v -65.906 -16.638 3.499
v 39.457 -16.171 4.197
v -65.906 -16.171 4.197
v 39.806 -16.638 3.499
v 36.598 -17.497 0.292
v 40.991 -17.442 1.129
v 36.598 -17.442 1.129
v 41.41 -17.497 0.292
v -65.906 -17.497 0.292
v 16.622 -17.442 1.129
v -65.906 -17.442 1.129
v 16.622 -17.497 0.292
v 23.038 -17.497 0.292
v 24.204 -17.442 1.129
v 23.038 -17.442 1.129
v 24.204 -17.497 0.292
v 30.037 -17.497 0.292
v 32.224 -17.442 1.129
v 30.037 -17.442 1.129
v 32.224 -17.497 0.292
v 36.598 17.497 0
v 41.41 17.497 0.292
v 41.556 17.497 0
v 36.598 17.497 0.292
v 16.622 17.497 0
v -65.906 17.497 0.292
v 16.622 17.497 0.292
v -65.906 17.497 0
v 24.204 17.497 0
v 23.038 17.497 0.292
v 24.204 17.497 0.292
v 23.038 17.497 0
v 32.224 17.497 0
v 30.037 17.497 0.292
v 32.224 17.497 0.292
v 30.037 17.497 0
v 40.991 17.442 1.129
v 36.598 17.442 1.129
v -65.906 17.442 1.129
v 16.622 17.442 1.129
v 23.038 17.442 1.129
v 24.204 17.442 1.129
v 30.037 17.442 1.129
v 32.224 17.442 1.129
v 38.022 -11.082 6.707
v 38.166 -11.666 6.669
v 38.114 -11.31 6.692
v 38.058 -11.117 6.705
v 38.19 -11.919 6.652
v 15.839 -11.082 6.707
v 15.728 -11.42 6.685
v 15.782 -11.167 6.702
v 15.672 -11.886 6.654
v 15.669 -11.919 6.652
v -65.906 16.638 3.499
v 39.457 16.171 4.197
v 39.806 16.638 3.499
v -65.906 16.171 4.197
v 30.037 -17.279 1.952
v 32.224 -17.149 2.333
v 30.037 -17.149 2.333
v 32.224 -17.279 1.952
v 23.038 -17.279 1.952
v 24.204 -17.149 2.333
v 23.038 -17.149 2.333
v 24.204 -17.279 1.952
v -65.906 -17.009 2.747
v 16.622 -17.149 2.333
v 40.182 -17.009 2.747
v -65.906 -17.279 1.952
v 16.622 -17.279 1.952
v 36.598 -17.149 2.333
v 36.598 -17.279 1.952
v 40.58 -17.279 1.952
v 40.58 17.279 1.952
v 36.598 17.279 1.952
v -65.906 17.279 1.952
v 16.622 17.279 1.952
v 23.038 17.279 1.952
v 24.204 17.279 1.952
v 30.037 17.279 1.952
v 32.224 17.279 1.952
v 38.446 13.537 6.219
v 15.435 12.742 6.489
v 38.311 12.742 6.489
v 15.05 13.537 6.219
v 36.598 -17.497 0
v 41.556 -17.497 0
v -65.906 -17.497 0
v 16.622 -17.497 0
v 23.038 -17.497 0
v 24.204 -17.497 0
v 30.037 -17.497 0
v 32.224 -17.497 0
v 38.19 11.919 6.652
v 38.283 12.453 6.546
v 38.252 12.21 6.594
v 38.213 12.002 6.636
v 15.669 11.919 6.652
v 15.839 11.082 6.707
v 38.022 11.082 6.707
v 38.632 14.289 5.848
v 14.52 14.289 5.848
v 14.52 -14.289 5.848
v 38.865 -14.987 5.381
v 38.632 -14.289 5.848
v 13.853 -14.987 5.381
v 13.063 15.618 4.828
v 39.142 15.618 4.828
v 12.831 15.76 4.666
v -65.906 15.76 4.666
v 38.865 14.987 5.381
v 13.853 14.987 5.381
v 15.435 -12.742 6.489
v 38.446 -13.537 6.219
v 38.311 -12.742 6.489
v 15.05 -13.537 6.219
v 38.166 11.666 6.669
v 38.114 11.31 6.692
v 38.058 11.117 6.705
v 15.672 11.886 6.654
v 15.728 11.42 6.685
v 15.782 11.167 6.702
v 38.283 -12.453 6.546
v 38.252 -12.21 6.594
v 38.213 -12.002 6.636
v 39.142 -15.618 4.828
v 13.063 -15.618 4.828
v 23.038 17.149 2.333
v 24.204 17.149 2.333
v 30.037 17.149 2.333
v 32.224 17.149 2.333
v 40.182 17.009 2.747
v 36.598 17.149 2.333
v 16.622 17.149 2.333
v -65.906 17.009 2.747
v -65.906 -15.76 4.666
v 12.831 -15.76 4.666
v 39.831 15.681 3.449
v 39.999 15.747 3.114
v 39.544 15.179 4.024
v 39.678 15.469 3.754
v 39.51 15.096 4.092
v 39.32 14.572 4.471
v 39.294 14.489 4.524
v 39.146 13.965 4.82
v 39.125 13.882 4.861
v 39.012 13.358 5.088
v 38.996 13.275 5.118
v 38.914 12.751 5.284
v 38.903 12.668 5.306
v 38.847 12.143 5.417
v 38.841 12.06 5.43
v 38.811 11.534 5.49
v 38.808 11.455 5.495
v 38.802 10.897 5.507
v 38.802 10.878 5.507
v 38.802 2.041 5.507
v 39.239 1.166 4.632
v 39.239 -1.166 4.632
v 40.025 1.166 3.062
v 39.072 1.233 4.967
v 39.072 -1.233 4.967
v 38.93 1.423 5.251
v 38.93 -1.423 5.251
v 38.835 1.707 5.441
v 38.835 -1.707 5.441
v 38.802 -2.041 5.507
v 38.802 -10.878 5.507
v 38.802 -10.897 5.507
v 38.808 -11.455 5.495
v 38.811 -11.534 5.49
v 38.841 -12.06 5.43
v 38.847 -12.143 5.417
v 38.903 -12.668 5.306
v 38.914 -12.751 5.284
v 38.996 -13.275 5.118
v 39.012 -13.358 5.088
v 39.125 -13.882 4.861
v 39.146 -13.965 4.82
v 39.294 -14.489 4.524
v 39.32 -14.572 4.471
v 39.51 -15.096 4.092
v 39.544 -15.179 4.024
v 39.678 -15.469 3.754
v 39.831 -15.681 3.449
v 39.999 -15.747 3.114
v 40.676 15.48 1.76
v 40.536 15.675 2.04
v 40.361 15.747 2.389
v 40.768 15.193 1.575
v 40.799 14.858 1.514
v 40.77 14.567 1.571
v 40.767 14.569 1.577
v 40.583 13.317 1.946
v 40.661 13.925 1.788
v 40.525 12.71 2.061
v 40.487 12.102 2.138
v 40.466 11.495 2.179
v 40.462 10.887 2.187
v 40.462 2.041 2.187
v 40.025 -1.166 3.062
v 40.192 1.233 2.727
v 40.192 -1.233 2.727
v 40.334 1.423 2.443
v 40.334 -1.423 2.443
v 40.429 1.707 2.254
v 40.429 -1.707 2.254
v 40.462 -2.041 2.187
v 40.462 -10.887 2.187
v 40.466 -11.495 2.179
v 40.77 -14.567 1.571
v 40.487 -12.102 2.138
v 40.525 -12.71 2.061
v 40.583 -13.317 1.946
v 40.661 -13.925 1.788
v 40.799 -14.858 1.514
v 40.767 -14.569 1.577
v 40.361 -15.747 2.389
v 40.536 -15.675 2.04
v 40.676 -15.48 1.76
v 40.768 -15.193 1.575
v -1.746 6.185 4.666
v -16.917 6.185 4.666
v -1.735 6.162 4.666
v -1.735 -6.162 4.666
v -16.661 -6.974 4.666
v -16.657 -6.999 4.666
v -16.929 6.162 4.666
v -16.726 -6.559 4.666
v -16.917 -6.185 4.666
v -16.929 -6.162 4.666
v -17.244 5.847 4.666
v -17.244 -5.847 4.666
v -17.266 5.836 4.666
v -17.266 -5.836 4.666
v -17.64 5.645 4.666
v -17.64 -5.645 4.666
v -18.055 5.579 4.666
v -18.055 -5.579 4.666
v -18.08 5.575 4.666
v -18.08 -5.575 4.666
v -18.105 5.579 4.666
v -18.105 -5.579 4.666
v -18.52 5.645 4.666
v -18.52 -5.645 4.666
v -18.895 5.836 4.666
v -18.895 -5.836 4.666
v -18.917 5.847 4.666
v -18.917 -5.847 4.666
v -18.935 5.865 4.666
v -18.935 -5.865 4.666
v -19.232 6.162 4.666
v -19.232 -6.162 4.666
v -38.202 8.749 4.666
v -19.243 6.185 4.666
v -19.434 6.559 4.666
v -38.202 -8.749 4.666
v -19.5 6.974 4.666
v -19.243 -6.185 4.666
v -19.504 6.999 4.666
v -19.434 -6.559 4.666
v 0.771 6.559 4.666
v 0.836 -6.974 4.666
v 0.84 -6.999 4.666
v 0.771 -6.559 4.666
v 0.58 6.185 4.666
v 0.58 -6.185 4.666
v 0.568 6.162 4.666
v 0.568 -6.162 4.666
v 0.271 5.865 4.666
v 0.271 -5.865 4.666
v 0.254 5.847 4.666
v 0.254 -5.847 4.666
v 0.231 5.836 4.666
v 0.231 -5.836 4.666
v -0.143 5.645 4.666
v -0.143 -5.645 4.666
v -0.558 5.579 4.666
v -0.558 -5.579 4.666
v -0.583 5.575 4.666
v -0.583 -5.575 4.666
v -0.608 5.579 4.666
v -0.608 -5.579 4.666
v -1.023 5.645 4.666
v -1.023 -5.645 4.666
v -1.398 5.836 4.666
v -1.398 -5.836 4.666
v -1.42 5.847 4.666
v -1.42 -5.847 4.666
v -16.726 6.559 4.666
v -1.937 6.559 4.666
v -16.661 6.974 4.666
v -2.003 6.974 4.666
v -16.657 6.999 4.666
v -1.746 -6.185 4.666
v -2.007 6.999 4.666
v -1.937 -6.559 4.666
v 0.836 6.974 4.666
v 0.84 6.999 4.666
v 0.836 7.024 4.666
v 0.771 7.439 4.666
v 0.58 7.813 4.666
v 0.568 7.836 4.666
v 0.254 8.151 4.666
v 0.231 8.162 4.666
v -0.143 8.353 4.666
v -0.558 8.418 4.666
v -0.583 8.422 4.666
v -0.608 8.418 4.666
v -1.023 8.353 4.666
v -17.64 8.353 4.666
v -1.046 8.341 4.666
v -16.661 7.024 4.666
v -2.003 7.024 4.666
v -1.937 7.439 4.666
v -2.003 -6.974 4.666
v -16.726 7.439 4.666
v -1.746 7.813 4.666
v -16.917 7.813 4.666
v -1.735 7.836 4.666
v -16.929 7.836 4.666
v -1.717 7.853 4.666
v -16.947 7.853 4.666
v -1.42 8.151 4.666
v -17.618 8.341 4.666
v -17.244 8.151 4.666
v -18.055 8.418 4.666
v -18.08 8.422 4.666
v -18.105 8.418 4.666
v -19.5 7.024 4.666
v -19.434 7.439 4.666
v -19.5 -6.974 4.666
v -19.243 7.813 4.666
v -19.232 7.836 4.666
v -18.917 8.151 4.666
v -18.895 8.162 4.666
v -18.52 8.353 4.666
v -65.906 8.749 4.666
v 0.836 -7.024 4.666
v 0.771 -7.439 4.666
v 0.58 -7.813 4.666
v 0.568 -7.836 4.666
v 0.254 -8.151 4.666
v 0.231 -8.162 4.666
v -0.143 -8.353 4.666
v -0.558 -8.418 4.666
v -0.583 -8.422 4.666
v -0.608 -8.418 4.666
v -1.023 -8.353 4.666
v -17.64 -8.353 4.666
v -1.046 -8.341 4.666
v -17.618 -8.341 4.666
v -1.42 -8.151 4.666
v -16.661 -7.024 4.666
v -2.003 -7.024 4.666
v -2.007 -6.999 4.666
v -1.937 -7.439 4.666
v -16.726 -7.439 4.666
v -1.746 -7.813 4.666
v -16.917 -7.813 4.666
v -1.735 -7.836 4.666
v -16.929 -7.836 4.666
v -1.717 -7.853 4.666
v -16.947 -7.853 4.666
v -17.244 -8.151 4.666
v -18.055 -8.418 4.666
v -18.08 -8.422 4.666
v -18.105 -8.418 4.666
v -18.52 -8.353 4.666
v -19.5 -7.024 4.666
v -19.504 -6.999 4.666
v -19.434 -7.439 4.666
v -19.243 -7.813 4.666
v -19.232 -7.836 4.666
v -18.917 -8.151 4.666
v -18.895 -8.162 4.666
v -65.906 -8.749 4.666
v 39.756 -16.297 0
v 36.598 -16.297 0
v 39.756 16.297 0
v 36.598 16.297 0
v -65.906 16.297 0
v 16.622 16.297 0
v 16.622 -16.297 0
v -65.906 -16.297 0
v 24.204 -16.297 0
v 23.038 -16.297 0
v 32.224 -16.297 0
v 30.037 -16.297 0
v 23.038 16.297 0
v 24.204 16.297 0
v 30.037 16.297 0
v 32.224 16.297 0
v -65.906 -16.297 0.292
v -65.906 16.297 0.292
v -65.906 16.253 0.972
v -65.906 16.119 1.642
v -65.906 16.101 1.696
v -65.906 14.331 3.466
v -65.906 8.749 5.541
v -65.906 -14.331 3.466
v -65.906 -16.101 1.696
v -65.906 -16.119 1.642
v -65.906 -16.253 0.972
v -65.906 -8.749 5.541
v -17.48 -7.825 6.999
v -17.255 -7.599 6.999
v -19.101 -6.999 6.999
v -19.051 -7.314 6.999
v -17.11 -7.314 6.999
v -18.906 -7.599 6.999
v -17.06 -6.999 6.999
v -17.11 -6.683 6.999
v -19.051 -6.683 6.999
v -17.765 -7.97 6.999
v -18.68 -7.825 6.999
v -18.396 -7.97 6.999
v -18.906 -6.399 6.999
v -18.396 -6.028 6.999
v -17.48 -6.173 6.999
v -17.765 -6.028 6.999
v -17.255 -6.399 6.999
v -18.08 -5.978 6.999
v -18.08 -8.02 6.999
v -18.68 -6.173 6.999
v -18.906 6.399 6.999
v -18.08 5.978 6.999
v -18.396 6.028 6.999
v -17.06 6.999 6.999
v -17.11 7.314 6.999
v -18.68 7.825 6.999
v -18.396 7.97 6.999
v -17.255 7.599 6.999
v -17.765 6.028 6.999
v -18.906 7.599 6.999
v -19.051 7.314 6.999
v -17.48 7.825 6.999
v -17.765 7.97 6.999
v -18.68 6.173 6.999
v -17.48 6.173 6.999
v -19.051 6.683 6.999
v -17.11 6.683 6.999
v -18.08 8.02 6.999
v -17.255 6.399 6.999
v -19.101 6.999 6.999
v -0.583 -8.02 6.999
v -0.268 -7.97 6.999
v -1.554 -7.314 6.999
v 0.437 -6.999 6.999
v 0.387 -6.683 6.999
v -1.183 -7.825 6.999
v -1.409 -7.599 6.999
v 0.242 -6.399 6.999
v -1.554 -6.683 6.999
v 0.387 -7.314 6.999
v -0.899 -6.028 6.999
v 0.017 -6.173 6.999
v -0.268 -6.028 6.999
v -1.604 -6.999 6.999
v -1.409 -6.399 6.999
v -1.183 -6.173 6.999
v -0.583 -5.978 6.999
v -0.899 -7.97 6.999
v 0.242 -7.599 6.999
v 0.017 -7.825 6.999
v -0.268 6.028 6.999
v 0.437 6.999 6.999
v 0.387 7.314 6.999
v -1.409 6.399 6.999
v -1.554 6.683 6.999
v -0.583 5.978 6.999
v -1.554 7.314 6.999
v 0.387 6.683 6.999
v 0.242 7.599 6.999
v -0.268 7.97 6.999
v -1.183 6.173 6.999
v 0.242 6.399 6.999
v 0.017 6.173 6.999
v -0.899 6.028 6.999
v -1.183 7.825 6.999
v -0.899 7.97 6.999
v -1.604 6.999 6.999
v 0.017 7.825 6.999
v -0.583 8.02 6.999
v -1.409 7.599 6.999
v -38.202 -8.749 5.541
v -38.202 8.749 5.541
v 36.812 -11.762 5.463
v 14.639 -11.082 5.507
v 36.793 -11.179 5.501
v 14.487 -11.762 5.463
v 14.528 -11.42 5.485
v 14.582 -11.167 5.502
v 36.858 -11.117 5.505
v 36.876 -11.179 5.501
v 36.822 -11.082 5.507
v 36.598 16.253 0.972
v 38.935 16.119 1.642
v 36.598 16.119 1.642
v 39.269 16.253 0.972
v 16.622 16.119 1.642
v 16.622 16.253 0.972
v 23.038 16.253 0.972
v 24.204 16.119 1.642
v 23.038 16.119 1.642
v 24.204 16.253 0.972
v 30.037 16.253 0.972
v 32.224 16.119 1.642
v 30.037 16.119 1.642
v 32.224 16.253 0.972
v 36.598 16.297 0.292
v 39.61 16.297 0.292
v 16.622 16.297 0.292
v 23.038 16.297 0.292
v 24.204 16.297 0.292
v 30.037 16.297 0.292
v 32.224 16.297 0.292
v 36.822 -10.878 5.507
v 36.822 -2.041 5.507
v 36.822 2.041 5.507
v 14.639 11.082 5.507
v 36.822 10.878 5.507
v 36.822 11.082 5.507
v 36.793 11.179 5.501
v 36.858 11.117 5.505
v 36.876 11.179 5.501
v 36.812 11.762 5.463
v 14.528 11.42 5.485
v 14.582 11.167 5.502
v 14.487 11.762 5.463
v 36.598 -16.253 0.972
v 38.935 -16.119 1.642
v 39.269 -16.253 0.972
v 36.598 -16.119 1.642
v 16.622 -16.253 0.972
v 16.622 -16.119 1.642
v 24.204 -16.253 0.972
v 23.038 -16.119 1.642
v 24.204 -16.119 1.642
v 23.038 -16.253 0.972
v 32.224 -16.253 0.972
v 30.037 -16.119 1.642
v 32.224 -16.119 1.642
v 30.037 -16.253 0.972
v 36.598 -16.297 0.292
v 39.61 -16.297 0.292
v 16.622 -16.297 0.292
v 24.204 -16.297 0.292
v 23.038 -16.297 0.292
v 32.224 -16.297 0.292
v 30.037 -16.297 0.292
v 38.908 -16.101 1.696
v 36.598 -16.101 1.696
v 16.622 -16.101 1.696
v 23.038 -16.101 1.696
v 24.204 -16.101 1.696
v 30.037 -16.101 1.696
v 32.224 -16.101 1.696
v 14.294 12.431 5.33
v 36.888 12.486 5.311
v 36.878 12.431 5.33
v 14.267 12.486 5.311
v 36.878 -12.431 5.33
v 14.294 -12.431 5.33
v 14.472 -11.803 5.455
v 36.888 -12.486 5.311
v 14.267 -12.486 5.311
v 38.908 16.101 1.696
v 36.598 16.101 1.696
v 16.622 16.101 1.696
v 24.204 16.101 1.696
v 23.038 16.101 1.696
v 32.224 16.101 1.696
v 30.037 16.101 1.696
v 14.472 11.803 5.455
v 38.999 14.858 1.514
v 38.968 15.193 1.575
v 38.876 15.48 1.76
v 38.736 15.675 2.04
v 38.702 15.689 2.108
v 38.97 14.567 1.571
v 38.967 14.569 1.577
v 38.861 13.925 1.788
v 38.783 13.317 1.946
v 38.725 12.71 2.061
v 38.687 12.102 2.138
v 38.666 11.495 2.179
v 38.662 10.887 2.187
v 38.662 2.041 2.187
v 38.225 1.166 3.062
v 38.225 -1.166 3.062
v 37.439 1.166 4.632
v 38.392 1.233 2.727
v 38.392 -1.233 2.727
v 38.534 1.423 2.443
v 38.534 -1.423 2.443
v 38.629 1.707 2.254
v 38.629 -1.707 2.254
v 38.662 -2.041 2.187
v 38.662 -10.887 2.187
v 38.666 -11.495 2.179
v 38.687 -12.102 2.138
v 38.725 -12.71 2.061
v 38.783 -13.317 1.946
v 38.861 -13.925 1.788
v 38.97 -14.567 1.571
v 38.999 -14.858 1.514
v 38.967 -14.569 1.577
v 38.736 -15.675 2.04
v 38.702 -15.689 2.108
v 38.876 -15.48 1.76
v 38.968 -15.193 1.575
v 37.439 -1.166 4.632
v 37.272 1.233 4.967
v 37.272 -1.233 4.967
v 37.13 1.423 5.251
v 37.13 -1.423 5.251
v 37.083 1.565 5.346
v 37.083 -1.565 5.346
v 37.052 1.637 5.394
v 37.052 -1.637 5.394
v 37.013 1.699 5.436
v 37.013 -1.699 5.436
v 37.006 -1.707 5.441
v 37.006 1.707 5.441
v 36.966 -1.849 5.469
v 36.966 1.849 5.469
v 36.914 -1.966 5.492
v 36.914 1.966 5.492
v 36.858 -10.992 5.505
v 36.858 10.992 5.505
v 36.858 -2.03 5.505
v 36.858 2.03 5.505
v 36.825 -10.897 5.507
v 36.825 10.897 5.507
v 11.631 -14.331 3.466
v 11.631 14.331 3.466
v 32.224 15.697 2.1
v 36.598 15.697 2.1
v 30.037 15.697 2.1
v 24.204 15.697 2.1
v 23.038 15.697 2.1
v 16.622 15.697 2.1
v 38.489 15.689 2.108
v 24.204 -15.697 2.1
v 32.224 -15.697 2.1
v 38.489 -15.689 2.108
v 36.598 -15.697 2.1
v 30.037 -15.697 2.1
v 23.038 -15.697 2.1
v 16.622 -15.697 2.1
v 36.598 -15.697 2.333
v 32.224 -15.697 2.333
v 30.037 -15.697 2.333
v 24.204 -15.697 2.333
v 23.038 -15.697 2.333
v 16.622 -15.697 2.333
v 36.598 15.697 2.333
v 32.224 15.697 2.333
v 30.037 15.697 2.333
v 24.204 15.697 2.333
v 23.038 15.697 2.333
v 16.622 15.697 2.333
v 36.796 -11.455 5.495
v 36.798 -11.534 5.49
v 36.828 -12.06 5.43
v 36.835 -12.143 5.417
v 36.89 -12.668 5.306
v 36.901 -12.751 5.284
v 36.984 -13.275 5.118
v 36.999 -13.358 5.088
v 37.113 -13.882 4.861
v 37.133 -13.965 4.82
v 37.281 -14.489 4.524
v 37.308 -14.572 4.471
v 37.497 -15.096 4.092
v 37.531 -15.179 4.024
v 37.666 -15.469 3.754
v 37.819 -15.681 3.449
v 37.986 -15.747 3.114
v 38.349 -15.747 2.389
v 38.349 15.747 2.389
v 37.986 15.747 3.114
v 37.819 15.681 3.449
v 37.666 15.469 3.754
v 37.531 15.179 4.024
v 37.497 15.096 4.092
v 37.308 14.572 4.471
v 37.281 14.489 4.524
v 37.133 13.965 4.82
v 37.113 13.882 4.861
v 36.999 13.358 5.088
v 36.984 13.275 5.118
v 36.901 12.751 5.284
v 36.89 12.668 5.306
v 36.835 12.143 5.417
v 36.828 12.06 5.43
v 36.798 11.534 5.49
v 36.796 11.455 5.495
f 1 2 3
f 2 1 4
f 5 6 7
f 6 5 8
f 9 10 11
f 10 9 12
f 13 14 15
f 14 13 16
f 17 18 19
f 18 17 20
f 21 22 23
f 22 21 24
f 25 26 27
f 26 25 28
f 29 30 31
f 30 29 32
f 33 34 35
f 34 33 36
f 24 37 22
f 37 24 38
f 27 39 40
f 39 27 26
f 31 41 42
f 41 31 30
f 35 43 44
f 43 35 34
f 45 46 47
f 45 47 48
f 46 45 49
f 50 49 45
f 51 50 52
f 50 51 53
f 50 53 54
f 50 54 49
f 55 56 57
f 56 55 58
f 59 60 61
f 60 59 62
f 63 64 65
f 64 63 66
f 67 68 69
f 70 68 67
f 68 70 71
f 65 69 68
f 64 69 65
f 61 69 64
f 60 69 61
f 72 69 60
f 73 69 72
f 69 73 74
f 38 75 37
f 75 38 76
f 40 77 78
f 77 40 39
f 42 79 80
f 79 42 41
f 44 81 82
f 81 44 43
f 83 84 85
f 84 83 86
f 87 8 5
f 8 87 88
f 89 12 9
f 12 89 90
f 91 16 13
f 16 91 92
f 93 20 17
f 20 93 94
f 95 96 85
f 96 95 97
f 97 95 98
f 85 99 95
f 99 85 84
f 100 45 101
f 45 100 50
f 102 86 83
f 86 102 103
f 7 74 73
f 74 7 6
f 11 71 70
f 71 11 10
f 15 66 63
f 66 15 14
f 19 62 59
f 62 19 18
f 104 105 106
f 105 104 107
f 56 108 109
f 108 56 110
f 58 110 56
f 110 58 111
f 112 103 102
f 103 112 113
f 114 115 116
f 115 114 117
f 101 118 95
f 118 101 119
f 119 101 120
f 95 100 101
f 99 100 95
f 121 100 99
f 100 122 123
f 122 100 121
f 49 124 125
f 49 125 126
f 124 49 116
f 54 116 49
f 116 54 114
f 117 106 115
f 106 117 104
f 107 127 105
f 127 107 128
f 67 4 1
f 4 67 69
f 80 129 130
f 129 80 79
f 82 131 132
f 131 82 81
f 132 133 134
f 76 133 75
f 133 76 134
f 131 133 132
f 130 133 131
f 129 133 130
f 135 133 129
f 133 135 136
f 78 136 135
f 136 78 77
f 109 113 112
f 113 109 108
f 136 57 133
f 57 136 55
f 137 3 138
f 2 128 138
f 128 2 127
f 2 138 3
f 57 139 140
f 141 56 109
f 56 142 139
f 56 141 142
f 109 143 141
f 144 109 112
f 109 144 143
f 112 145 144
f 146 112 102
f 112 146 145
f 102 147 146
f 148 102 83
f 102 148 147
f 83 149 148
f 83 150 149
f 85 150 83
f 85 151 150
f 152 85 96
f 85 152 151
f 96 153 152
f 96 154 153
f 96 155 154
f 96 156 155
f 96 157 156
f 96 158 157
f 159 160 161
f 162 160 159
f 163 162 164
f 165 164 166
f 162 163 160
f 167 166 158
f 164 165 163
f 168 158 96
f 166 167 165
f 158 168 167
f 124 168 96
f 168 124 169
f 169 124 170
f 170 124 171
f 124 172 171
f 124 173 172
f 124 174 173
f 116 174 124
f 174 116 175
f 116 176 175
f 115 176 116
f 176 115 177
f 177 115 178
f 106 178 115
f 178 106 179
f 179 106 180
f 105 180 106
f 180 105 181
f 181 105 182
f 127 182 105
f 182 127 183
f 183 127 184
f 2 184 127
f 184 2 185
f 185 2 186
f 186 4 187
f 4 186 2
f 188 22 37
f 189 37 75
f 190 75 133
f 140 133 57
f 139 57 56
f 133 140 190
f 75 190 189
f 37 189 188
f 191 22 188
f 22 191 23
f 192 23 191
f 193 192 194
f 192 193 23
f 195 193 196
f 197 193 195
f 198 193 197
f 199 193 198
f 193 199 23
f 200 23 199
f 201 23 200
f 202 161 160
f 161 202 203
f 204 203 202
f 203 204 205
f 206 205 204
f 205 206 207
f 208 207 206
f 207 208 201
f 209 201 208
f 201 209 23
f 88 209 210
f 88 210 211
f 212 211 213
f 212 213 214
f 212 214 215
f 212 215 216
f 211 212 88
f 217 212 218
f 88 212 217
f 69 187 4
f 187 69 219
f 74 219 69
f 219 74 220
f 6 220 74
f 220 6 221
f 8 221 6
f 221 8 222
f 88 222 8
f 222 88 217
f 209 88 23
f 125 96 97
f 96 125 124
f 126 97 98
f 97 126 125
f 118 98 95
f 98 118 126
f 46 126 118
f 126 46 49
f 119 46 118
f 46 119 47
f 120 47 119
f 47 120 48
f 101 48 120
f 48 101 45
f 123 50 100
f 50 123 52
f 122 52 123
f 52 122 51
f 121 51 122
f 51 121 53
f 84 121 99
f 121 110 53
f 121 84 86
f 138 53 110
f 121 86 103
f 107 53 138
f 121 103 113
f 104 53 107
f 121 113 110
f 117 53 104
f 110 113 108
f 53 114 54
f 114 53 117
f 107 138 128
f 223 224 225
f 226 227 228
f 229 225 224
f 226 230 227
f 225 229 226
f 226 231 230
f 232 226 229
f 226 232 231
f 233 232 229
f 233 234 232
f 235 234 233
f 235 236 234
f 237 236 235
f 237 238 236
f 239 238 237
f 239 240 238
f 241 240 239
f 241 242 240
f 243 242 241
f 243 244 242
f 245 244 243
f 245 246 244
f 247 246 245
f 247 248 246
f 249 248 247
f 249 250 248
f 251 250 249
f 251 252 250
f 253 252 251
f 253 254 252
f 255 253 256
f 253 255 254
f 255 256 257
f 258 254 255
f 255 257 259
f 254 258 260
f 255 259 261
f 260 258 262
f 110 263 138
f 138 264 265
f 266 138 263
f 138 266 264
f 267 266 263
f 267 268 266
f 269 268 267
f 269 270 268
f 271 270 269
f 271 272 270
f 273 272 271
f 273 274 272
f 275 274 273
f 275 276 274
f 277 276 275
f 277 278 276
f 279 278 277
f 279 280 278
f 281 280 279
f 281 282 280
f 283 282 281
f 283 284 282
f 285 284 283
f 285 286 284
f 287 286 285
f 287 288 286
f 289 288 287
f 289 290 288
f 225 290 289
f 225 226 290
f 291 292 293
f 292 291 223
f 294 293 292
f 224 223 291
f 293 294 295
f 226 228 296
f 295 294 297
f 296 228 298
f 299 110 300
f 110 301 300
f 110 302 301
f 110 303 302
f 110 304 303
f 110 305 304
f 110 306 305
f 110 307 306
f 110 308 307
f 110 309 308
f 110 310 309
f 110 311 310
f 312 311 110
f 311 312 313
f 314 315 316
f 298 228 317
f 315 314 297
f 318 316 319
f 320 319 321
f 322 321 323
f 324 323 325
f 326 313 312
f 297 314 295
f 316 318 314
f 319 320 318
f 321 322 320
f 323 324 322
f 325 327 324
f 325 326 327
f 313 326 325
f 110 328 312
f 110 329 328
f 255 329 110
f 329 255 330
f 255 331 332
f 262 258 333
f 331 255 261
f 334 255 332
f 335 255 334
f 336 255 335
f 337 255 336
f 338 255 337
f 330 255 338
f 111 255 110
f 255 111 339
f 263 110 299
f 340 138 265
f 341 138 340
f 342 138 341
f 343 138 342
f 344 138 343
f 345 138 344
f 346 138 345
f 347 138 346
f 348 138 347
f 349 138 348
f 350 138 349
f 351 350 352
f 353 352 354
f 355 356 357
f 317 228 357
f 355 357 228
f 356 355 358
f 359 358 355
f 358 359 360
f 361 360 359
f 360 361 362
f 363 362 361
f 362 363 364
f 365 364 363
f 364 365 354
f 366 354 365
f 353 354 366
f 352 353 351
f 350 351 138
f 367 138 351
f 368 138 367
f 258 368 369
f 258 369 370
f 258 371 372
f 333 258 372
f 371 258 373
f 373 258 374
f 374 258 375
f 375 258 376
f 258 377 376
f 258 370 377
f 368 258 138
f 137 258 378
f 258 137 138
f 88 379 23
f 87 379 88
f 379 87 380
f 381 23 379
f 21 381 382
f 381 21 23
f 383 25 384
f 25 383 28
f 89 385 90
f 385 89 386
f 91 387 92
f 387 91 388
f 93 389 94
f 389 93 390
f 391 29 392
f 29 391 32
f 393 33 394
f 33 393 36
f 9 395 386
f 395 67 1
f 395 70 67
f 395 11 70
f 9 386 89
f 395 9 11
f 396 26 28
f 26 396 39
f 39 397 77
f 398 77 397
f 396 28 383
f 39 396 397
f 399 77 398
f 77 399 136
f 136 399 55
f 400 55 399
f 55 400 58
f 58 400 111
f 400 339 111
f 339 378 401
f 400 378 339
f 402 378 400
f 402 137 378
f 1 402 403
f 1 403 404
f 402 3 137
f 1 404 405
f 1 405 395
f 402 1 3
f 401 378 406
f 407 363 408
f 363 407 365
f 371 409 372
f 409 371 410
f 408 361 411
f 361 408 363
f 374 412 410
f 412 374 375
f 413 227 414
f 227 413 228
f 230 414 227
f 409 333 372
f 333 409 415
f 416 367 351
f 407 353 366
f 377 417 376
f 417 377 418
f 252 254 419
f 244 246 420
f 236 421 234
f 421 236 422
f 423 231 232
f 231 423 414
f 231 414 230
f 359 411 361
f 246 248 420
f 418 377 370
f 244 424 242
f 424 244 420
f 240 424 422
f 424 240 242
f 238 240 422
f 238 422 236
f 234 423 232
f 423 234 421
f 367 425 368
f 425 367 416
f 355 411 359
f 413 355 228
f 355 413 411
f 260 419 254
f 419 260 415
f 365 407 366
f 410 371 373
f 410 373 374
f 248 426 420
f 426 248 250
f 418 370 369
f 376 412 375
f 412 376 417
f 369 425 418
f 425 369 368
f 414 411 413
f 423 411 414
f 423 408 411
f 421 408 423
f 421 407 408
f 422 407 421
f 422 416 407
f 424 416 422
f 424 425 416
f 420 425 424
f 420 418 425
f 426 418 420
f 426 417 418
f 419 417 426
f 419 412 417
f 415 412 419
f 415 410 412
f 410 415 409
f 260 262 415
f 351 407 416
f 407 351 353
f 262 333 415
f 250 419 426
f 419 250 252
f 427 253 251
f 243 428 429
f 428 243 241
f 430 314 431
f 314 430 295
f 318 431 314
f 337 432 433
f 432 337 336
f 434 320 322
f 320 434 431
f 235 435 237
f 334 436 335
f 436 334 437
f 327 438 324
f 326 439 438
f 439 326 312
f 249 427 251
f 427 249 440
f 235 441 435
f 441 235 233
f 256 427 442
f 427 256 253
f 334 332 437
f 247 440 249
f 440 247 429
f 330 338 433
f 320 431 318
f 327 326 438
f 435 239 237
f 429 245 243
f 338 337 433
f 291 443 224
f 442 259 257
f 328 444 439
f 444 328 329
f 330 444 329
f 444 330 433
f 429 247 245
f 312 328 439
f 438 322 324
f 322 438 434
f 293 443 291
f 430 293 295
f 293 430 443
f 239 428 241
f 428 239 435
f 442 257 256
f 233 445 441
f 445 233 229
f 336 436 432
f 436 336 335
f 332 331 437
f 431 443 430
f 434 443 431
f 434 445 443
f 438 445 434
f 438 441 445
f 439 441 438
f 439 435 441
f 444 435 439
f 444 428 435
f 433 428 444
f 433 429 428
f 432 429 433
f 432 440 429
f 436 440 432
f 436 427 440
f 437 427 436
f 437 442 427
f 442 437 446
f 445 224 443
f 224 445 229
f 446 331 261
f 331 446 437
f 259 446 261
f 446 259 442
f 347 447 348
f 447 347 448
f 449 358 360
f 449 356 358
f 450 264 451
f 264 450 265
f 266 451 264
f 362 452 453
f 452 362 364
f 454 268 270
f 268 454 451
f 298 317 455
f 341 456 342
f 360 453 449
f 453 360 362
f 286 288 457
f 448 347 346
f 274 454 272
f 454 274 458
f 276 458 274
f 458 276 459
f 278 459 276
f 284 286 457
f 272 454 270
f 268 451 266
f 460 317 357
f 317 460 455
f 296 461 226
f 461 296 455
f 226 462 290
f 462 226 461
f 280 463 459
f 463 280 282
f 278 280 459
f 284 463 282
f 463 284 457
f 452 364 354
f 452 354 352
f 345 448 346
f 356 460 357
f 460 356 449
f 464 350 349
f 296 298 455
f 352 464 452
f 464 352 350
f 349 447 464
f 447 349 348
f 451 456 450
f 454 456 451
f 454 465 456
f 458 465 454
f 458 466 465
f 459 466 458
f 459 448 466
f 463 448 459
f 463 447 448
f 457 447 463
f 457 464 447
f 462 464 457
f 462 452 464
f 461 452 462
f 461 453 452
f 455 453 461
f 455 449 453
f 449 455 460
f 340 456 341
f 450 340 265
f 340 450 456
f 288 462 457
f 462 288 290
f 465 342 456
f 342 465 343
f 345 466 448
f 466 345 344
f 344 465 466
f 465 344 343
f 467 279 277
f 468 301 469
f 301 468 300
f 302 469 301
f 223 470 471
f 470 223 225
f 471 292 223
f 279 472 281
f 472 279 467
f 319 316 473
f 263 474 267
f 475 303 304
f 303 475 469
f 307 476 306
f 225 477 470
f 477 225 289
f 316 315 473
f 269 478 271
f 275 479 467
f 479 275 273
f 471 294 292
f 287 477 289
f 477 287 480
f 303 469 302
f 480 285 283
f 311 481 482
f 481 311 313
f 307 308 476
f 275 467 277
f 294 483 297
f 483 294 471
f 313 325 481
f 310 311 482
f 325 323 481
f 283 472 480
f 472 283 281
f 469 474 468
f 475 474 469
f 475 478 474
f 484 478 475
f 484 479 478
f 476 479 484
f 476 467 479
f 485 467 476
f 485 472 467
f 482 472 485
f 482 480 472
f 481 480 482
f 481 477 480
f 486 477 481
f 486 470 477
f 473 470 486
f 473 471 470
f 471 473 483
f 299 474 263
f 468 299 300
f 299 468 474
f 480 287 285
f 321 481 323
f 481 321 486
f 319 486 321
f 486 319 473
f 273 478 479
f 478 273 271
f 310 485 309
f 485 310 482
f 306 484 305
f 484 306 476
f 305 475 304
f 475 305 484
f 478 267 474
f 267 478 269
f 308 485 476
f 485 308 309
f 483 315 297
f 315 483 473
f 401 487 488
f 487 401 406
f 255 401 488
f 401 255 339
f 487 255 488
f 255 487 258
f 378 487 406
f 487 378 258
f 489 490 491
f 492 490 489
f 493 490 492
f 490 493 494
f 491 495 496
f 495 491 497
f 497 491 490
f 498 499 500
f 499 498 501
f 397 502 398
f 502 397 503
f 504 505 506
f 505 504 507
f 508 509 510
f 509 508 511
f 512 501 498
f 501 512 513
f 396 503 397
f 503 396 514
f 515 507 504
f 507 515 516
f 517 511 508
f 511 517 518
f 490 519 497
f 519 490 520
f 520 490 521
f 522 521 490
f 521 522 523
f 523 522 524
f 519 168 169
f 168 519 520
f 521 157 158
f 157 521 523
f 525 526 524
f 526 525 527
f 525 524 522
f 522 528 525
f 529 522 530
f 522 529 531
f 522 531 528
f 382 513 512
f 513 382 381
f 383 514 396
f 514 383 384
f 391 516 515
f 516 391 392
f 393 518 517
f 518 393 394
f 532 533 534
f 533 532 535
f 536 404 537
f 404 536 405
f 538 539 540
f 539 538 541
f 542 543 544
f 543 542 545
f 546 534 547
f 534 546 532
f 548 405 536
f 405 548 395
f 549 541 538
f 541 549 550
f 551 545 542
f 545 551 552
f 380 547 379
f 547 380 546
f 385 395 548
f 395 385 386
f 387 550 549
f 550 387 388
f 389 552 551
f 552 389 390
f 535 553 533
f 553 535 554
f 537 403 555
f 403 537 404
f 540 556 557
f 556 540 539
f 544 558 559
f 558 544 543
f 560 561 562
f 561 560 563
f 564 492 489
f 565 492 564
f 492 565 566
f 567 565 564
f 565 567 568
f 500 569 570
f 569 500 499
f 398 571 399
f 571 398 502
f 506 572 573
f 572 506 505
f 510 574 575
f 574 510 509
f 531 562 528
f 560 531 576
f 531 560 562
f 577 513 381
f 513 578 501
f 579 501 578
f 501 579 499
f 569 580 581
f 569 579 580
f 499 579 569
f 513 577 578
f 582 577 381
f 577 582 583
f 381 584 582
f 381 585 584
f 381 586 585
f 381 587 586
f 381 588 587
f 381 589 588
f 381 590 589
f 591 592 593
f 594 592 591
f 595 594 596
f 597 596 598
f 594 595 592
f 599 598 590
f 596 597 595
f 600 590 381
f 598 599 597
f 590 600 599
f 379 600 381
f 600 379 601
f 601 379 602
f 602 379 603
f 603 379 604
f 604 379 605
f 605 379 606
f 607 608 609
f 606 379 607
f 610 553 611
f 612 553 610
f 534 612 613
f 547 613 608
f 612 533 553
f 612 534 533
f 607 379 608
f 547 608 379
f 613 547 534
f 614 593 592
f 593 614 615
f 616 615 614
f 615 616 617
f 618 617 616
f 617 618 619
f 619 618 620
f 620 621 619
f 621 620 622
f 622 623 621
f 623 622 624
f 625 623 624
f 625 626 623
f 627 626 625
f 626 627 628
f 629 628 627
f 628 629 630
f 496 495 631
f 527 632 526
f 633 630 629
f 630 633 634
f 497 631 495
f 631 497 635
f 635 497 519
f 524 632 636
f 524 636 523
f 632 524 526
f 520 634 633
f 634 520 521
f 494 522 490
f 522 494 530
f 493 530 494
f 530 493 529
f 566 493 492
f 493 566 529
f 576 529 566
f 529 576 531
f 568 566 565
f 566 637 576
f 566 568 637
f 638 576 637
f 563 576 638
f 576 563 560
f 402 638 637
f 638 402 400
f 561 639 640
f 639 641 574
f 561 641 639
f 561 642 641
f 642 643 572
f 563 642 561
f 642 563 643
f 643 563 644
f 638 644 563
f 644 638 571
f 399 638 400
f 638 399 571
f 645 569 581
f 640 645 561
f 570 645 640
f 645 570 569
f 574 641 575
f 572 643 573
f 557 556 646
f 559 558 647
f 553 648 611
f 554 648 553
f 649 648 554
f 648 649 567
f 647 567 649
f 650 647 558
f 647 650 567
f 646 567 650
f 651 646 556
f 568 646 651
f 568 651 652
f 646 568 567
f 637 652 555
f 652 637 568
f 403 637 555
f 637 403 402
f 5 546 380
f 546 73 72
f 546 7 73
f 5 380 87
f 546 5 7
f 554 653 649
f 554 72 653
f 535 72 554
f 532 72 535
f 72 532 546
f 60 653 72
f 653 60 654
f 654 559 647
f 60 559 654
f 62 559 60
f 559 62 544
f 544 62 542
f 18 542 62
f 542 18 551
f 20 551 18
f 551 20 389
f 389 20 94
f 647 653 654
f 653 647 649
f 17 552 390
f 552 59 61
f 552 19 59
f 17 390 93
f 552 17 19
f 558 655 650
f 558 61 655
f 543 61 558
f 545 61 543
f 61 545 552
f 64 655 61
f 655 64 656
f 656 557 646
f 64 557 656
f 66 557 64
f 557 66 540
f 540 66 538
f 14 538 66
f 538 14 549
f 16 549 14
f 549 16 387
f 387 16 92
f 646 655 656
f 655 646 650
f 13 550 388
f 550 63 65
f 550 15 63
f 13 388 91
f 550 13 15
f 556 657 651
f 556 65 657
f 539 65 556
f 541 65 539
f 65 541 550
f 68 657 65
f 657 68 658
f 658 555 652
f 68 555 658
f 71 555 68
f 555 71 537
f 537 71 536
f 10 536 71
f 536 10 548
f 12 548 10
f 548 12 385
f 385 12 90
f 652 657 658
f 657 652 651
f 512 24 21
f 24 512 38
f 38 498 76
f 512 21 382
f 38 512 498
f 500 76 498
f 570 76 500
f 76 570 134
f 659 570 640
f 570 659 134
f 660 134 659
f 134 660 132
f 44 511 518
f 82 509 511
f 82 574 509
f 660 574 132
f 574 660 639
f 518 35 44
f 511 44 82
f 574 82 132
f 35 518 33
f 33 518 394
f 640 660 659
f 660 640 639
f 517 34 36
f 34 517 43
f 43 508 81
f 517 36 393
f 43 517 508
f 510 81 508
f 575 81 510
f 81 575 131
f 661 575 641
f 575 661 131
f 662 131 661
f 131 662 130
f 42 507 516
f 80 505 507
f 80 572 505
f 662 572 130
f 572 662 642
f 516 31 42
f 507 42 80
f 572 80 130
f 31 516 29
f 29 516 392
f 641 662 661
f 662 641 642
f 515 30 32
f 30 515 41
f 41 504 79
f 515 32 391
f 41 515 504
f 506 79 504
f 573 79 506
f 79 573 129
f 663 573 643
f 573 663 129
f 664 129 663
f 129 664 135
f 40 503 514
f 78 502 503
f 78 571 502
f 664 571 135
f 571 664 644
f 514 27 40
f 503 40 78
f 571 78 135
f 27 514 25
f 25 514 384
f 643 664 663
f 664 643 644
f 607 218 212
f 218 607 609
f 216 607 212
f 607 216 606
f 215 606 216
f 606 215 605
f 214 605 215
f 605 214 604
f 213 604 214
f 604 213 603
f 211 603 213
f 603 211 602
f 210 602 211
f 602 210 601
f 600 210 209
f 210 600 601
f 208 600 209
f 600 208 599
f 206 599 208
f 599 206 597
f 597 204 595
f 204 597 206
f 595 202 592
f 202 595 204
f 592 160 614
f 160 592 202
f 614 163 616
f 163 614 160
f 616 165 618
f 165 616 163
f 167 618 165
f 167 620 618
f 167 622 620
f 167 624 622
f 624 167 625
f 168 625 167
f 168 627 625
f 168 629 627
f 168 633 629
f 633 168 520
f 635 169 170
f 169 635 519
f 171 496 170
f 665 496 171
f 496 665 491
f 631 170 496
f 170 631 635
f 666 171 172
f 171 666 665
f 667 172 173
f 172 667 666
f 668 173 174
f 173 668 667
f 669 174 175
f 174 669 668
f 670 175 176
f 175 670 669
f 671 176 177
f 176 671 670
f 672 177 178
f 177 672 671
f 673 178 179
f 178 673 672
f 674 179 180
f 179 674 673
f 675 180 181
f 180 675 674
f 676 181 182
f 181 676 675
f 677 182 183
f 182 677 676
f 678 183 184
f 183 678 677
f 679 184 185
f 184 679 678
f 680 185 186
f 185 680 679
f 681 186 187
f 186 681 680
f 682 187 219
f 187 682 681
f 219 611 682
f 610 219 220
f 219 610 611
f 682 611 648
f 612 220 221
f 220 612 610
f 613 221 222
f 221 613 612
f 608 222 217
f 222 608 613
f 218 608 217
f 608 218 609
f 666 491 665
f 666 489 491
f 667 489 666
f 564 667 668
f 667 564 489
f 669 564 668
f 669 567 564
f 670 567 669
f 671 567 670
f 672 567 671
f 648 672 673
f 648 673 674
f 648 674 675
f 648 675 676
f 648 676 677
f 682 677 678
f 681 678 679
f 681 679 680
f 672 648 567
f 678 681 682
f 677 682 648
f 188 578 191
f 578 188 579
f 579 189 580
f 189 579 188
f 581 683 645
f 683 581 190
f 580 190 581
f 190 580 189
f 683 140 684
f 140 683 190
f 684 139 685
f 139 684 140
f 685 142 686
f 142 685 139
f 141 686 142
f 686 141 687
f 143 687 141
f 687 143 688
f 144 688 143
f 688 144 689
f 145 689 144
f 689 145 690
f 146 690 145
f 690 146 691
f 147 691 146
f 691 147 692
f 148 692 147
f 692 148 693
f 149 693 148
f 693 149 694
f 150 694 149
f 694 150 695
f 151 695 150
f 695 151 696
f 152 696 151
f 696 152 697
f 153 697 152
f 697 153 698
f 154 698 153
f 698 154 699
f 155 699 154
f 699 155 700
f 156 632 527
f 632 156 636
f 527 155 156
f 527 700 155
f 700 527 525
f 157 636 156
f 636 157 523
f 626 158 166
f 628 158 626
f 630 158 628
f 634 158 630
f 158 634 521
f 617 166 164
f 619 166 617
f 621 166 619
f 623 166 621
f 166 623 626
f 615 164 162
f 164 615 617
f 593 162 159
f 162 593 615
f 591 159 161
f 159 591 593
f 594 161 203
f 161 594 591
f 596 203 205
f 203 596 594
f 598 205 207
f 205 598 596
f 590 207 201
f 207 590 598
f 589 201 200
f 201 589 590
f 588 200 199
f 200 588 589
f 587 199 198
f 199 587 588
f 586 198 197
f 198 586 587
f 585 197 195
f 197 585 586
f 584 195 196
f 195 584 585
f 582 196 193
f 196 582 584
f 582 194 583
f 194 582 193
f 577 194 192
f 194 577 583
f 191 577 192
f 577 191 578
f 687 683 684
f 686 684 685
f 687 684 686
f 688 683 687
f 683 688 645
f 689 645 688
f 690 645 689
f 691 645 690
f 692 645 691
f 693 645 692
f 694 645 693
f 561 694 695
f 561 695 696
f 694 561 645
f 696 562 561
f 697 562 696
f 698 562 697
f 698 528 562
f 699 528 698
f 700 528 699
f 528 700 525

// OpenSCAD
// Milwaukee Road Little Joe, HO scale 1-87 - print 4 of 11: roof_2 - roof, section 2 (print upright)
// Render (F6), export STL, print. Settings: ../../library/lj_params.scad
// Whole loco preview and notes: ../../MILW_LittleJoe_Main.scad
SCALE_SEL = "HO";
LOCO_SEL = "E70";   // [E20, E21, E70, E71, E72, E73, E74, E75, E76, E77, E78, E79] the body and roof change for E20 / E21
include <../../library/lj_all.scad>
lj_plate("roof_2");
